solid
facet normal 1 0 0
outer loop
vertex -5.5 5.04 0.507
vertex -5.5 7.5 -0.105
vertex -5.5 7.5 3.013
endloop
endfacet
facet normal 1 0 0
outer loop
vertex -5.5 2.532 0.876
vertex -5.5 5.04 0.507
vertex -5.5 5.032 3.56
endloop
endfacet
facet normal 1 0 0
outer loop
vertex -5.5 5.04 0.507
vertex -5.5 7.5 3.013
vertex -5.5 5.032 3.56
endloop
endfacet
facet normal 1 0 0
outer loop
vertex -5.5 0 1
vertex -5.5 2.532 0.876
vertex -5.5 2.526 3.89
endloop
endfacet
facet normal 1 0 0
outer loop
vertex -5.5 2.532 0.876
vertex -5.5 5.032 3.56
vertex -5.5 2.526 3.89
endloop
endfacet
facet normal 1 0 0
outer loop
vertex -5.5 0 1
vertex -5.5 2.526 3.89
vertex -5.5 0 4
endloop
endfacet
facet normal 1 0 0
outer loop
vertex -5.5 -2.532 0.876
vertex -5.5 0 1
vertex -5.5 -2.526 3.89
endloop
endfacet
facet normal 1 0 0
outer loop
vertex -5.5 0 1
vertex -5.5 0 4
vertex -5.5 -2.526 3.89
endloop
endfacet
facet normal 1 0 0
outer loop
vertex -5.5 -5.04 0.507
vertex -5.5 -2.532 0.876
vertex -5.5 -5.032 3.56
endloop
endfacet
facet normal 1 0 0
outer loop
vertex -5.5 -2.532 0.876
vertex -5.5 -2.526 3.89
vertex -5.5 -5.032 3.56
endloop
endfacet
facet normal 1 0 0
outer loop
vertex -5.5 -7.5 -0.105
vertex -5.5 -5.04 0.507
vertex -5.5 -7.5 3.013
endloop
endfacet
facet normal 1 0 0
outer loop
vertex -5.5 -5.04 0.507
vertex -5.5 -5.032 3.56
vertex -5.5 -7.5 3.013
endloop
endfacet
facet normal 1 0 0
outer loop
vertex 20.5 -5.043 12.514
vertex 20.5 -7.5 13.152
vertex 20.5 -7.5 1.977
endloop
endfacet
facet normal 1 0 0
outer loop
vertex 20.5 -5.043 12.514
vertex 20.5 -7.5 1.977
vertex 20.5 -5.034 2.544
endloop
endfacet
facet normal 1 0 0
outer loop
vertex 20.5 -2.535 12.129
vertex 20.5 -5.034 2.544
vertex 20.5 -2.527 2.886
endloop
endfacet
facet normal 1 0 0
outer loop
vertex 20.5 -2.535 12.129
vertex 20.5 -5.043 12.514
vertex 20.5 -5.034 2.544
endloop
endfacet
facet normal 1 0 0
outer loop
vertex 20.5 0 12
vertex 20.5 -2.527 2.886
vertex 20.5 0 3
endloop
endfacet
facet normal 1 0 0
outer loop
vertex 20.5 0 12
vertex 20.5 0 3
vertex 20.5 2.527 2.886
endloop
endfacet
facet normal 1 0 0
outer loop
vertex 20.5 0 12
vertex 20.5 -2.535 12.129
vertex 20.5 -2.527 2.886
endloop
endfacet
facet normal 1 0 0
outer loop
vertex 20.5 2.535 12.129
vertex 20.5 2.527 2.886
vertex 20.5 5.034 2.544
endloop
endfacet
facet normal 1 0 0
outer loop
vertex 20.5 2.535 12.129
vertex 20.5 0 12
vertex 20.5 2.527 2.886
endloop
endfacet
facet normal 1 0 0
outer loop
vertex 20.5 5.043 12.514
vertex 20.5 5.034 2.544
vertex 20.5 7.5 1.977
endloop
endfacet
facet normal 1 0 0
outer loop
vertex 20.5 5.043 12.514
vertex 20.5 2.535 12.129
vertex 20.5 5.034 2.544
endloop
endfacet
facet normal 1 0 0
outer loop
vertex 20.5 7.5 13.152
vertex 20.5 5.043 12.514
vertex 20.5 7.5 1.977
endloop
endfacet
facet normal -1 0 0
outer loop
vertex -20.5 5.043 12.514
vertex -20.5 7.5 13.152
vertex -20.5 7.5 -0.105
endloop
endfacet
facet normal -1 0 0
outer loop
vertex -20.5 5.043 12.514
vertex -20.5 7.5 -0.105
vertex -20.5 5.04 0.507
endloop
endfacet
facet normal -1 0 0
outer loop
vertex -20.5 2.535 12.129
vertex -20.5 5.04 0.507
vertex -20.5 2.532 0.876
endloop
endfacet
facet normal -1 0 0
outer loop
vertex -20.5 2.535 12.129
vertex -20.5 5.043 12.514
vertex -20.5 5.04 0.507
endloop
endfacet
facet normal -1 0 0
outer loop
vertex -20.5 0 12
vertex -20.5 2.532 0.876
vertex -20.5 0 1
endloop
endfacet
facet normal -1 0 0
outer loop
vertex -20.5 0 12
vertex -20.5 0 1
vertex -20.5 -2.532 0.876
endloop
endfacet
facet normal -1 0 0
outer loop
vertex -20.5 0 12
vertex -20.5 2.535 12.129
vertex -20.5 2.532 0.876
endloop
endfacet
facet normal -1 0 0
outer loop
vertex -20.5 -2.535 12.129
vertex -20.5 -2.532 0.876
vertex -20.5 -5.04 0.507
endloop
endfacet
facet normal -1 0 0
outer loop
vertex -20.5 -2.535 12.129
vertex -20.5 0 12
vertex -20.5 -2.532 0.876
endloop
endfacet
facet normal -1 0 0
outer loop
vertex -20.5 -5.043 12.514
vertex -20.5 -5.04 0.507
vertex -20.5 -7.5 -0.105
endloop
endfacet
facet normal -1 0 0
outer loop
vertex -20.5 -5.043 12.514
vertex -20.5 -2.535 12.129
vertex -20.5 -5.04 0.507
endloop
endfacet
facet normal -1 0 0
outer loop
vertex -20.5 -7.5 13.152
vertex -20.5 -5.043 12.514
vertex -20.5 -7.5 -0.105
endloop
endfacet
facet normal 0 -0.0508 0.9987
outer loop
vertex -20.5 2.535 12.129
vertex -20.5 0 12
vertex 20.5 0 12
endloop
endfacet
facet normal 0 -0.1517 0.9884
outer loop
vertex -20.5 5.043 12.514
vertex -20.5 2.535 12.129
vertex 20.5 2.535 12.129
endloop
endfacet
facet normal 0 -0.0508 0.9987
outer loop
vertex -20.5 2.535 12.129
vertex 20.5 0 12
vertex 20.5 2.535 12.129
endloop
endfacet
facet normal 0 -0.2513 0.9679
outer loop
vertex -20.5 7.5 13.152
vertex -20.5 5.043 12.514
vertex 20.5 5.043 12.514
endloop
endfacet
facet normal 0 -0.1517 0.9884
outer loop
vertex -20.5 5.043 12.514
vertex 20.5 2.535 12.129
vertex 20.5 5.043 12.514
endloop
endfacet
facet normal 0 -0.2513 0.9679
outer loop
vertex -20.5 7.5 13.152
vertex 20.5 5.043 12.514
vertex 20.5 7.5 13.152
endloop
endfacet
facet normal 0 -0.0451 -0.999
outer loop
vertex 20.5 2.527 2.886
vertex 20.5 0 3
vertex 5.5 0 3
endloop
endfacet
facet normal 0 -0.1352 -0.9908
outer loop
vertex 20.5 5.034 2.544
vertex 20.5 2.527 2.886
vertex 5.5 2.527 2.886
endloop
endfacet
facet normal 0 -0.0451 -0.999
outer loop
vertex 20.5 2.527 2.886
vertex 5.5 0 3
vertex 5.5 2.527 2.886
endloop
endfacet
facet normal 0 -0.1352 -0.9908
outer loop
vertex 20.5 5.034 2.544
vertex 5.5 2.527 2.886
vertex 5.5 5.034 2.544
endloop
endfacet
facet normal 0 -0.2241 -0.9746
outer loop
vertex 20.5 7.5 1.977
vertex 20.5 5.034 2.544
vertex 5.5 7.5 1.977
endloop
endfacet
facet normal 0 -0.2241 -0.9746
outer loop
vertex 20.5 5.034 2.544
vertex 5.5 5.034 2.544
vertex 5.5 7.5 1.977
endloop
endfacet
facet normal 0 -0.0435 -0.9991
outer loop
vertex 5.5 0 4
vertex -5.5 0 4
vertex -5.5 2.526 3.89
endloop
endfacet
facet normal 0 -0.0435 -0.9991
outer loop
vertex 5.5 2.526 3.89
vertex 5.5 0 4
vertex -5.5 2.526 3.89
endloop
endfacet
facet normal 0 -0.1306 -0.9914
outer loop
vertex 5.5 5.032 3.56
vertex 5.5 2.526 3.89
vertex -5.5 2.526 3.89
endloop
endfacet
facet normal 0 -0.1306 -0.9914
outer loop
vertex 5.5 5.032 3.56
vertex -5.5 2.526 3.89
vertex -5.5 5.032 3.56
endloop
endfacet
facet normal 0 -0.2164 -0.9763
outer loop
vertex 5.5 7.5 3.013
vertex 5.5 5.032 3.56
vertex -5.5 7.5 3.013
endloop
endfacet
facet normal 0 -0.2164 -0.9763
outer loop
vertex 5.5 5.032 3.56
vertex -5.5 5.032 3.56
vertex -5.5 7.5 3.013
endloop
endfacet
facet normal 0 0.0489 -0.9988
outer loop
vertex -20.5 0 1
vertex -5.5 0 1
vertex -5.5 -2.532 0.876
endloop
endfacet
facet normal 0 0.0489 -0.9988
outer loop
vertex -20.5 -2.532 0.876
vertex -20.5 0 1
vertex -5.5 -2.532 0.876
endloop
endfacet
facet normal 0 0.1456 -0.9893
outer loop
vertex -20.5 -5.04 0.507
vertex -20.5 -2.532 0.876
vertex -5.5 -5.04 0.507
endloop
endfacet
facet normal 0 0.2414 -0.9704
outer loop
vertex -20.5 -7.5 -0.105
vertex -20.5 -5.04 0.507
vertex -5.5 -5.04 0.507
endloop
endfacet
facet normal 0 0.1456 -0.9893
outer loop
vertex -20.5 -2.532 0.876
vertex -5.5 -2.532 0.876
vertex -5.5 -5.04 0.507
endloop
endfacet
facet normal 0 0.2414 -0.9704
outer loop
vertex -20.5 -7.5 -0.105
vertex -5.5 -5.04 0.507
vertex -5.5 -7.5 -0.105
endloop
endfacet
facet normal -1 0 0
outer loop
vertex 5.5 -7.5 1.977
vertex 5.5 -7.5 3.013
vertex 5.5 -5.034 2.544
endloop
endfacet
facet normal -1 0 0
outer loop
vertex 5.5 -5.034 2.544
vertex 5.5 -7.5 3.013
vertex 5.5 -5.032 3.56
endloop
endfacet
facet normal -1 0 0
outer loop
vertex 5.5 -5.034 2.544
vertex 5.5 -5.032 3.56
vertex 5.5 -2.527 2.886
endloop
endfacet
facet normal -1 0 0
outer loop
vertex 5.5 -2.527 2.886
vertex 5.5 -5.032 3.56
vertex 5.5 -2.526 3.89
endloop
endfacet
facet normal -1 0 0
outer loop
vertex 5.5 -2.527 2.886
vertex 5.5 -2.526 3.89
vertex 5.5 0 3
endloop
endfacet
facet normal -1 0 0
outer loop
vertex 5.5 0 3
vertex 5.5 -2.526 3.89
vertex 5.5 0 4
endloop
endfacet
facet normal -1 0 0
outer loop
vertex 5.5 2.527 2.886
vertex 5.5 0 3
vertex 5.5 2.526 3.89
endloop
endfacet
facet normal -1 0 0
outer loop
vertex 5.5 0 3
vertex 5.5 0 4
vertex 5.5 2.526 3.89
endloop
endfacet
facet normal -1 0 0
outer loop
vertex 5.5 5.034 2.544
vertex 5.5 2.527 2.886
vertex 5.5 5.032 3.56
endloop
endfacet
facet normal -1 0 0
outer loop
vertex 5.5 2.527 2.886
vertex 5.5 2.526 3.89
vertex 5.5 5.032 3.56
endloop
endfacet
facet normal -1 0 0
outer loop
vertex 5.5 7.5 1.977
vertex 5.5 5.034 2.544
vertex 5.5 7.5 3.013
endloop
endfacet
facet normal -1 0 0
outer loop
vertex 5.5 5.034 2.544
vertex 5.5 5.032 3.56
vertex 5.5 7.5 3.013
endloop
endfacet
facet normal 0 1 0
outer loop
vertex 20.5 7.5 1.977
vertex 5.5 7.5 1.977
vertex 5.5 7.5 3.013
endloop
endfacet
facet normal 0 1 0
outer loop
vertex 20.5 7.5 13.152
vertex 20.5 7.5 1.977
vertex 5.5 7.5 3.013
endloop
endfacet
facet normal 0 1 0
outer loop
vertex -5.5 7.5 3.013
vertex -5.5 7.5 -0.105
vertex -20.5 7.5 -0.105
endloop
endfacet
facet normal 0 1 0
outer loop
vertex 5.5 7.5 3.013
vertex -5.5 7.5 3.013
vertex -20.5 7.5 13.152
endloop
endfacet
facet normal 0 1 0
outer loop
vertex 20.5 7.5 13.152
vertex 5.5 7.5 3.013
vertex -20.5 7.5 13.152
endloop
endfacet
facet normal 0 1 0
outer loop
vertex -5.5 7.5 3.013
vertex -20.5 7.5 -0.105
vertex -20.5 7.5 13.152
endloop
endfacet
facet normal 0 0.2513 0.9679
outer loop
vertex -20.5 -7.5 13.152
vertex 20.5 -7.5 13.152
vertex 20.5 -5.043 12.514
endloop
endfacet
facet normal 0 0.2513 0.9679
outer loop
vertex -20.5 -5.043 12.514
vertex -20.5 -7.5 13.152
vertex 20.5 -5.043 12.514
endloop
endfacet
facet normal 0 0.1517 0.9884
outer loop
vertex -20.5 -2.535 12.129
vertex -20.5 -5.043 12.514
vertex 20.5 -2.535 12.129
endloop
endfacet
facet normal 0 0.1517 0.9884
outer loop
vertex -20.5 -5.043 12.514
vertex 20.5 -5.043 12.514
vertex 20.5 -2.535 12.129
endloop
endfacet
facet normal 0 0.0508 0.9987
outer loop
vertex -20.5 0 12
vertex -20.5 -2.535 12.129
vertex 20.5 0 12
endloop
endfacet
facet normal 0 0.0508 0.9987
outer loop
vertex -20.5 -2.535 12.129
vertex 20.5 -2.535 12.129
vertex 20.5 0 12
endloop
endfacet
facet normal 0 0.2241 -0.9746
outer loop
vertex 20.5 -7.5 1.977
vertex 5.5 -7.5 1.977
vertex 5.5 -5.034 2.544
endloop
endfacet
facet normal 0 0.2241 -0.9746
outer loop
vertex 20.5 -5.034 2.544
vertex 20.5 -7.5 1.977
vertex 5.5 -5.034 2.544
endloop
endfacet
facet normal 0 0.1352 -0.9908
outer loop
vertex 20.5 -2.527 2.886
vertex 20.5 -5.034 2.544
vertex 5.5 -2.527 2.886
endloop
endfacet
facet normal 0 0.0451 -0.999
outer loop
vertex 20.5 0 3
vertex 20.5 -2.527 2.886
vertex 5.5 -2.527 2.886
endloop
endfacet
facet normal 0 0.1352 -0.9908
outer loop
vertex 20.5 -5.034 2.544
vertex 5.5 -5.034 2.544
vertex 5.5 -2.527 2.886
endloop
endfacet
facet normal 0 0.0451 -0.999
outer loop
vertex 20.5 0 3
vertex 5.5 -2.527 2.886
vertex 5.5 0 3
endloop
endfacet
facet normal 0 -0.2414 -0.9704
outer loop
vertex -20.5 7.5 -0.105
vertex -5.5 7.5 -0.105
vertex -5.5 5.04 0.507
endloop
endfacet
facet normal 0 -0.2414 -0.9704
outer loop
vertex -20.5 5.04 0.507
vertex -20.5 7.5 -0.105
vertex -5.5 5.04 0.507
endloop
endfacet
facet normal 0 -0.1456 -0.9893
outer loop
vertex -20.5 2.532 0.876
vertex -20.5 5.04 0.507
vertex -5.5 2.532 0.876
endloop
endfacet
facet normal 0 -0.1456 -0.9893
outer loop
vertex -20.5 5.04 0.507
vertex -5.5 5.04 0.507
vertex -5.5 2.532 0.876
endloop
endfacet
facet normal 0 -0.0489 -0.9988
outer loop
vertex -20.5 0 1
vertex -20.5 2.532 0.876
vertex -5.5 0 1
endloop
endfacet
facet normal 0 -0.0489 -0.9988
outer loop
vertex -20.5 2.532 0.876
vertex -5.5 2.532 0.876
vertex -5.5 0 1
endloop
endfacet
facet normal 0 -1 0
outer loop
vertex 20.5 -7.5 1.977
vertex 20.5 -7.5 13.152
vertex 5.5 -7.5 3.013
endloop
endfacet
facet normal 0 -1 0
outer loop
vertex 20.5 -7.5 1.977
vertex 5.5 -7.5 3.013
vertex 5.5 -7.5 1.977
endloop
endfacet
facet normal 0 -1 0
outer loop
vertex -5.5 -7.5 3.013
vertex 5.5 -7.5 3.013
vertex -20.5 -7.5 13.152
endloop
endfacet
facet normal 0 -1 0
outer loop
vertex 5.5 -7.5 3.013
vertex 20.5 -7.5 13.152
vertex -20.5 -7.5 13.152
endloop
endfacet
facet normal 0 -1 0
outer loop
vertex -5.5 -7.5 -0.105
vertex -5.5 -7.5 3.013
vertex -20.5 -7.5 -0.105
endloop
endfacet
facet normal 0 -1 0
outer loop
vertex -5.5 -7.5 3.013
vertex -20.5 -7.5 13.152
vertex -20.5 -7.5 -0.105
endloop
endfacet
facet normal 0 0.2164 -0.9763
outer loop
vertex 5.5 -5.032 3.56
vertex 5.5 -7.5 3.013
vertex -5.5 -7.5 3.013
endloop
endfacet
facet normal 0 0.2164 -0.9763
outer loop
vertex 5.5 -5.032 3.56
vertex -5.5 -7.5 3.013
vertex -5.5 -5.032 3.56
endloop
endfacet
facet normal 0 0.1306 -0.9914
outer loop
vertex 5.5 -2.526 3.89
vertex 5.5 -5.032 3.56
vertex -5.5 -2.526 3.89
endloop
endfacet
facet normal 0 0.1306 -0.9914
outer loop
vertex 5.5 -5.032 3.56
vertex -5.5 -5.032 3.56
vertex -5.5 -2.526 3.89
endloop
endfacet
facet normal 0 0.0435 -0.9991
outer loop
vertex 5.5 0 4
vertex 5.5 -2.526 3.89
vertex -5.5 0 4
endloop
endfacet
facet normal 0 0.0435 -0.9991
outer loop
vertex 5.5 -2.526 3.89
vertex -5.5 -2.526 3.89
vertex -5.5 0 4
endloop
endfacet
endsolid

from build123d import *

# Parameters (mm, degrees)
F0_W     = 11
F0_H     = 15
F1_DEPTH = 20
F3_DEPTH = 11
F5_DEPTH = 15
F7_DEPTH = 15
F9_DEPTH = 54.1


with BuildPart() as f1:
    # F0 (on Top) → F1 (new body)
    with BuildSketch(Plane.XY):
        Rectangle(F0_W, F0_H)
    extrude(amount=F1_DEPTH)

    # F2 (on face) → F3 (cut)
    with BuildSketch(Plane(origin=(-5.5, 0, 0), x_dir=(0, -1, 0), z_dir=(-1, 0, 0))):
        with BuildLine():
            ThreePointArc((0, 4), (-20.5060966544, -45.5060966544), (29, -25))
            ThreePointArc((29, -25), (20.5060966544, -4.4939033456), (0, 4))
        make_face()
    extrude(amount=-F3_DEPTH, mode=Mode.SUBTRACT)

    # F4 (on face) → F5 (join)
    with BuildSketch(Plane(origin=(-5.5, 0, 0), x_dir=(0, -1, 0), z_dir=(-1, 0, 0))):
        with BuildLine():
            Line((0, 20), (-7.5, 20))
            Line((-7.5, 20), (-7.5, 3.0133896557))
            ThreePointArc((-7.5, 3.0133896557), (-3.7823074958, 3.7522894742), (0, 4))
            Line((0, 4), (0, 20))
        make_face()
        with BuildLine():
            Line((7.5, 20), (0, 20))
            Line((0, 20), (0, 4))
            ThreePointArc((0, 4), (3.7823074958, 3.7522894742), (7.5, 3.0133896557))
            Line((7.5, 3.0133896557), (7.5, 20))
        make_face()
        with BuildLine():
            ThreePointArc((0, 4), (-3.7823074958, 3.7522894742), (-7.5, 3.0133896557))
            Line((-7.5, 3.0133896557), (-7.5, -0.105221431))
            ThreePointArc((-7.5, -0.105221431), (-3.7904984636, 0.7222106631), (0, 1))
            Line((0, 1), (0, 4))
        make_face()
        with BuildLine():
            ThreePointArc((7.5, 3.0133896557), (3.7823074958, 3.7522894742), (0, 4))
            Line((0, 4), (0, 1))
            ThreePointArc((0, 1), (3.7904984636, 0.7222106631), (7.5, -0.105221431))
            Line((7.5, -0.105221431), (7.5, 3.0133896557))
        make_face()
    extrude(amount=F5_DEPTH)

    # F6 (on face) → F7 (join)
    with BuildSketch(Plane.YZ.offset(5.5)):
        with BuildLine():
            Line((0, 20), (-7.5, 20))
            Line((-7.5, 20), (-7.5, 3.0133896557))
            ThreePointArc((-7.5, 3.0133896557), (-3.7823074958, 3.7522894742), (0, 4))
            Line((0, 4), (0, 20))
        make_face()
        with BuildLine():
            ThreePointArc((0, 4), (-3.7823074958, 3.7522894742), (-7.5, 3.0133896557))
            Line((-7.5, 3.0133896557), (-7.5, 1.9768419204))
            ThreePointArc((-7.5, 1.9768419204), (-3.7847342197, 2.7430313211), (0, 3))
            Line((0, 3), (0, 4))
        make_face()
        with BuildLine():
            ThreePointArc((7.5, 3.0133896557), (3.7823074958, 3.7522894742), (0, 4))
            Line((0, 4), (0, 3))
            ThreePointArc((0, 3), (3.7847342197, 2.7430313211), (7.5, 1.9768419204))
            Line((7.5, 1.9768419204), (7.5, 3.0133896557))
        make_face()
        with BuildLine():
            Line((7.5, 20), (0, 20))
            Line((0, 20), (0, 4))
            ThreePointArc((0, 4), (3.7823074958, 3.7522894742), (7.5, 3.0133896557))
            Line((7.5, 3.0133896557), (7.5, 20))
        make_face()
    extrude(amount=F7_DEPTH)

    # F8 (on face) → F9 (cut)
    with BuildSketch(Plane.YZ.offset(20.5)):
        with BuildLine():
            ThreePointArc((0, 12), (17.6776695297, 19.3223304703), (25, 37))
            ThreePointArc((25, 37), (-17.6776695297, 54.6776695297), (0, 12))
        make_face()
    extrude(amount=-F9_DEPTH, mode=Mode.SUBTRACT)


solid = f1.part
